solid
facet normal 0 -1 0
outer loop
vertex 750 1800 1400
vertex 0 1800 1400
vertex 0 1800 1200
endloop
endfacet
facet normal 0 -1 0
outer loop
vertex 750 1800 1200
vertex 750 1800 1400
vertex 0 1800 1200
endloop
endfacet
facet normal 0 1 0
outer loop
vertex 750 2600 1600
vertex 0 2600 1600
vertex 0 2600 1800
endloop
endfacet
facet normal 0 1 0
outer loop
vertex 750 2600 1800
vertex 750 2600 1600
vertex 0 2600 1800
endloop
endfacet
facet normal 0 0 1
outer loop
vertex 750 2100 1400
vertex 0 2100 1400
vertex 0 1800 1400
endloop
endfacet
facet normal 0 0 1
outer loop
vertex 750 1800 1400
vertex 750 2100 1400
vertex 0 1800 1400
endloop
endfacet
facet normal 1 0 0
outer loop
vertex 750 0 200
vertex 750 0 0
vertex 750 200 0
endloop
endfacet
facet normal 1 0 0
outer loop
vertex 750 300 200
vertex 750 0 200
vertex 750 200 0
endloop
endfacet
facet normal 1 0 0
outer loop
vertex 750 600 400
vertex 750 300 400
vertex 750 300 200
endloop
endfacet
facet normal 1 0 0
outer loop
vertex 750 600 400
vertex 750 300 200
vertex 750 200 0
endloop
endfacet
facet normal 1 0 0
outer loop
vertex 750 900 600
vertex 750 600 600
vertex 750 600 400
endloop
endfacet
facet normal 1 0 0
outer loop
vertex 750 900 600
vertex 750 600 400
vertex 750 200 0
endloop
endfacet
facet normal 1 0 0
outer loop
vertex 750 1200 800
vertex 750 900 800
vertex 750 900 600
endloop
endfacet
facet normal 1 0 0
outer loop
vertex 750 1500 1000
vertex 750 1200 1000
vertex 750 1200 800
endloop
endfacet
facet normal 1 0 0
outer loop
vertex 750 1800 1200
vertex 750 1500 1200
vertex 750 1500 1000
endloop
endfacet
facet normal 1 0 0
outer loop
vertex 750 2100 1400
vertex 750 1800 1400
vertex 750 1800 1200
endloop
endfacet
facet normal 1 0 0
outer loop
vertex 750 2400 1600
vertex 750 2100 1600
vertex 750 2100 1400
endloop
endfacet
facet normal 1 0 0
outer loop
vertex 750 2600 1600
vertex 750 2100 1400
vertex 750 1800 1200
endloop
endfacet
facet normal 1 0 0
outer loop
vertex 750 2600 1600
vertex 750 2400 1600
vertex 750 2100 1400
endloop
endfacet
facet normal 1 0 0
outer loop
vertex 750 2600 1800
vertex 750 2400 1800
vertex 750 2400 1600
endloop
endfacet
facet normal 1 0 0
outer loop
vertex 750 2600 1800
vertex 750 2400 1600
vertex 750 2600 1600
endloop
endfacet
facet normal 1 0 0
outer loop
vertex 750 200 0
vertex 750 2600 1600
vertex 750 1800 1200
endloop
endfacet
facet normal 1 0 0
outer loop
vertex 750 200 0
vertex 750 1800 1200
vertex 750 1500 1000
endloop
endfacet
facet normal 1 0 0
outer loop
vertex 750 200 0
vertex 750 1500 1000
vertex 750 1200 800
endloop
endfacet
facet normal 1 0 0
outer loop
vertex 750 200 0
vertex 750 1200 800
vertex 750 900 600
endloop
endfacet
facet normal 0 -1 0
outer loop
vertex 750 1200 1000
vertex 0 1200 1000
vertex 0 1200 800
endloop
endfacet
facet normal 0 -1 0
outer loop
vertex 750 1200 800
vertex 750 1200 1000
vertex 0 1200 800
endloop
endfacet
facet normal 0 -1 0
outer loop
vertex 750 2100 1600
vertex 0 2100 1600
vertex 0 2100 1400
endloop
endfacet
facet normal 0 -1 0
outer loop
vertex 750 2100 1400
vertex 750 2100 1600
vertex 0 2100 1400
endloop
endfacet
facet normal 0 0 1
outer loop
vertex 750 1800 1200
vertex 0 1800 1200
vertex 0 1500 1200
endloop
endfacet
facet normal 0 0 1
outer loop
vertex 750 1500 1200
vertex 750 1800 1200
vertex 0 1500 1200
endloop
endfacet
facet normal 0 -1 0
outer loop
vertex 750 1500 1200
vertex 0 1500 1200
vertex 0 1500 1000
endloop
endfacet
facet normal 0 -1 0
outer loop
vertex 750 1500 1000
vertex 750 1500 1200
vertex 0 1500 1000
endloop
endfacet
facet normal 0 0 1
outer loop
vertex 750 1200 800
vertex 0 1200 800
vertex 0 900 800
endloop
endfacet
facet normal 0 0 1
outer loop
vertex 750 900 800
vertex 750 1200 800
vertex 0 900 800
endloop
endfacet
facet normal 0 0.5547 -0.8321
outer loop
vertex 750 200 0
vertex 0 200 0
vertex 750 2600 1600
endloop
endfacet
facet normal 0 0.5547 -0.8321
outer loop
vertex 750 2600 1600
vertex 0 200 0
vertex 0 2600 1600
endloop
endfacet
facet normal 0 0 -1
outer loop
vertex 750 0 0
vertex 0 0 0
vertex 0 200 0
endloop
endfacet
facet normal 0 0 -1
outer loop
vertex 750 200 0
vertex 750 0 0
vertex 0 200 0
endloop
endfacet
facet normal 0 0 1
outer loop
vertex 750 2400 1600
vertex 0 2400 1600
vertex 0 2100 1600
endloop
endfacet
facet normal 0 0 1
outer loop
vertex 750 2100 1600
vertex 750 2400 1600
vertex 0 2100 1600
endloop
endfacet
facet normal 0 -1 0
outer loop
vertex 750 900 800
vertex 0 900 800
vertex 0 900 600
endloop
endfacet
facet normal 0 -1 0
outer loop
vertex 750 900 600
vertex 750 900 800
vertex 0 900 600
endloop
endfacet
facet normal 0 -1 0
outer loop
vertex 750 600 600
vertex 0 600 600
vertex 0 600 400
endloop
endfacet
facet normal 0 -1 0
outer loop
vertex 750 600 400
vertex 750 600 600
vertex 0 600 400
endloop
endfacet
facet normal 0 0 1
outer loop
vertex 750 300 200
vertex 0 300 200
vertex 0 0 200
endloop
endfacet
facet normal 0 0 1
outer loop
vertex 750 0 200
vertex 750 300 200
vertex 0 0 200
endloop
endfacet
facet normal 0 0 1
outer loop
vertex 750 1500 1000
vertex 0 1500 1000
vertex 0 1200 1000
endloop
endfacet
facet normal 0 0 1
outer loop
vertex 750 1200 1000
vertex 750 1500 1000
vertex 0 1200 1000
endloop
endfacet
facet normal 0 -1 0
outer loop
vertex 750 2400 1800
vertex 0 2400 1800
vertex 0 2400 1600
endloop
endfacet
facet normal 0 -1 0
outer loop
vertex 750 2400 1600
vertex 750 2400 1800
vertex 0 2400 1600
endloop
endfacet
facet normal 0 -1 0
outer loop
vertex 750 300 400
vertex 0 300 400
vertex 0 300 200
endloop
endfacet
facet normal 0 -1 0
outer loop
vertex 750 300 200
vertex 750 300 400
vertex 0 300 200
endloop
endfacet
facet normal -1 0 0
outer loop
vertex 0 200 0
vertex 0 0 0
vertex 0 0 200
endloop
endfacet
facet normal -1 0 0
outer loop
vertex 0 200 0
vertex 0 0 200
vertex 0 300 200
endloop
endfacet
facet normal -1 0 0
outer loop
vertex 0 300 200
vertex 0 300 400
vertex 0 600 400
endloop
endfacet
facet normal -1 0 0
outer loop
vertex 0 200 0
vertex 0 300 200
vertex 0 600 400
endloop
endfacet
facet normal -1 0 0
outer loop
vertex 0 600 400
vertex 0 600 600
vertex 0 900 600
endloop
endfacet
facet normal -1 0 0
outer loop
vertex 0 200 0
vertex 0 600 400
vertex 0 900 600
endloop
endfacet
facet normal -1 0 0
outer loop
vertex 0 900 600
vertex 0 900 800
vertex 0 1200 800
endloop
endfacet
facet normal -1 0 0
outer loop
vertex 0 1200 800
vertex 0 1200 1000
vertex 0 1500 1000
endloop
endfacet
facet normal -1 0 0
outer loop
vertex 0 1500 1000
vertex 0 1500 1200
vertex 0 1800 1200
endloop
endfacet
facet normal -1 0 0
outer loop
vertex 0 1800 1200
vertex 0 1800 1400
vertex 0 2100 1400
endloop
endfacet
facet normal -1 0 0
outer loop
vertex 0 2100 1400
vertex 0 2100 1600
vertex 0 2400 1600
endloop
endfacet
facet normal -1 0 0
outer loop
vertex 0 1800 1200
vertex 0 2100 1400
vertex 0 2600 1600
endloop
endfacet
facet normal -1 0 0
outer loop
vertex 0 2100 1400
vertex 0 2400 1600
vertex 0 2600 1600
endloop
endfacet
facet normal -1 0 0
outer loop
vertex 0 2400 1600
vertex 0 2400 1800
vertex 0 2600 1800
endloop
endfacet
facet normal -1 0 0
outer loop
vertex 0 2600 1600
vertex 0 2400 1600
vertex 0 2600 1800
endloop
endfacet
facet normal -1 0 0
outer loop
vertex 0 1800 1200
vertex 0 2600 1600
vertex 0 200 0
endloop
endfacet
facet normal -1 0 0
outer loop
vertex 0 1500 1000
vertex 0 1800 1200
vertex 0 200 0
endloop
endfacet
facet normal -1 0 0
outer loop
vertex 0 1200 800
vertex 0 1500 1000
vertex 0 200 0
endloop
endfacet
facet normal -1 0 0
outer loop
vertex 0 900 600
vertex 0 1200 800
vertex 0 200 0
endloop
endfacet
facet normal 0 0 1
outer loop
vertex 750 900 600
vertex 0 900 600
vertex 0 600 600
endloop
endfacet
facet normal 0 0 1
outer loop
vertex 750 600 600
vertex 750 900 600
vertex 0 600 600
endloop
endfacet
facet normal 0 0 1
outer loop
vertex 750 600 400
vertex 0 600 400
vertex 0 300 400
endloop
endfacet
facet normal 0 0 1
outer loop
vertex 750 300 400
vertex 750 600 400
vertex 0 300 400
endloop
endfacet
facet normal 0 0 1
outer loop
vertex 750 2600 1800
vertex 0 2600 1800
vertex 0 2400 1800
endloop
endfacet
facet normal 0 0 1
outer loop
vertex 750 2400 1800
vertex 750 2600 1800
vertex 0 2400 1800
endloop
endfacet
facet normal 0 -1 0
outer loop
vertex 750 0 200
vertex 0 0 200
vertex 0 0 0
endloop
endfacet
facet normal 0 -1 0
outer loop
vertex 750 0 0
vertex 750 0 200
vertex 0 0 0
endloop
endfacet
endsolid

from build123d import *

# Parameters (mm, degrees)
F1_DEPTH = 750


with BuildPart() as f1:
    # F0 (on Right) → F1 (new body)
    with BuildSketch(Plane.YZ):
        Polygon((0, 200), (0, 0), (200, 0), (2600, 1600), (2600, 1800), (2400, 1800), (2400, 1600), (2100, 1600), (2100, 1400), (1800, 1400), (1800, 1200), (1500, 1200), (1500, 1000), (1200, 1000), (1200, 800), (900, 800), (900, 600), (600, 600), (600, 400), (300, 400), (300, 200), align=None)
    extrude(amount=F1_DEPTH)


solid = f1.part
